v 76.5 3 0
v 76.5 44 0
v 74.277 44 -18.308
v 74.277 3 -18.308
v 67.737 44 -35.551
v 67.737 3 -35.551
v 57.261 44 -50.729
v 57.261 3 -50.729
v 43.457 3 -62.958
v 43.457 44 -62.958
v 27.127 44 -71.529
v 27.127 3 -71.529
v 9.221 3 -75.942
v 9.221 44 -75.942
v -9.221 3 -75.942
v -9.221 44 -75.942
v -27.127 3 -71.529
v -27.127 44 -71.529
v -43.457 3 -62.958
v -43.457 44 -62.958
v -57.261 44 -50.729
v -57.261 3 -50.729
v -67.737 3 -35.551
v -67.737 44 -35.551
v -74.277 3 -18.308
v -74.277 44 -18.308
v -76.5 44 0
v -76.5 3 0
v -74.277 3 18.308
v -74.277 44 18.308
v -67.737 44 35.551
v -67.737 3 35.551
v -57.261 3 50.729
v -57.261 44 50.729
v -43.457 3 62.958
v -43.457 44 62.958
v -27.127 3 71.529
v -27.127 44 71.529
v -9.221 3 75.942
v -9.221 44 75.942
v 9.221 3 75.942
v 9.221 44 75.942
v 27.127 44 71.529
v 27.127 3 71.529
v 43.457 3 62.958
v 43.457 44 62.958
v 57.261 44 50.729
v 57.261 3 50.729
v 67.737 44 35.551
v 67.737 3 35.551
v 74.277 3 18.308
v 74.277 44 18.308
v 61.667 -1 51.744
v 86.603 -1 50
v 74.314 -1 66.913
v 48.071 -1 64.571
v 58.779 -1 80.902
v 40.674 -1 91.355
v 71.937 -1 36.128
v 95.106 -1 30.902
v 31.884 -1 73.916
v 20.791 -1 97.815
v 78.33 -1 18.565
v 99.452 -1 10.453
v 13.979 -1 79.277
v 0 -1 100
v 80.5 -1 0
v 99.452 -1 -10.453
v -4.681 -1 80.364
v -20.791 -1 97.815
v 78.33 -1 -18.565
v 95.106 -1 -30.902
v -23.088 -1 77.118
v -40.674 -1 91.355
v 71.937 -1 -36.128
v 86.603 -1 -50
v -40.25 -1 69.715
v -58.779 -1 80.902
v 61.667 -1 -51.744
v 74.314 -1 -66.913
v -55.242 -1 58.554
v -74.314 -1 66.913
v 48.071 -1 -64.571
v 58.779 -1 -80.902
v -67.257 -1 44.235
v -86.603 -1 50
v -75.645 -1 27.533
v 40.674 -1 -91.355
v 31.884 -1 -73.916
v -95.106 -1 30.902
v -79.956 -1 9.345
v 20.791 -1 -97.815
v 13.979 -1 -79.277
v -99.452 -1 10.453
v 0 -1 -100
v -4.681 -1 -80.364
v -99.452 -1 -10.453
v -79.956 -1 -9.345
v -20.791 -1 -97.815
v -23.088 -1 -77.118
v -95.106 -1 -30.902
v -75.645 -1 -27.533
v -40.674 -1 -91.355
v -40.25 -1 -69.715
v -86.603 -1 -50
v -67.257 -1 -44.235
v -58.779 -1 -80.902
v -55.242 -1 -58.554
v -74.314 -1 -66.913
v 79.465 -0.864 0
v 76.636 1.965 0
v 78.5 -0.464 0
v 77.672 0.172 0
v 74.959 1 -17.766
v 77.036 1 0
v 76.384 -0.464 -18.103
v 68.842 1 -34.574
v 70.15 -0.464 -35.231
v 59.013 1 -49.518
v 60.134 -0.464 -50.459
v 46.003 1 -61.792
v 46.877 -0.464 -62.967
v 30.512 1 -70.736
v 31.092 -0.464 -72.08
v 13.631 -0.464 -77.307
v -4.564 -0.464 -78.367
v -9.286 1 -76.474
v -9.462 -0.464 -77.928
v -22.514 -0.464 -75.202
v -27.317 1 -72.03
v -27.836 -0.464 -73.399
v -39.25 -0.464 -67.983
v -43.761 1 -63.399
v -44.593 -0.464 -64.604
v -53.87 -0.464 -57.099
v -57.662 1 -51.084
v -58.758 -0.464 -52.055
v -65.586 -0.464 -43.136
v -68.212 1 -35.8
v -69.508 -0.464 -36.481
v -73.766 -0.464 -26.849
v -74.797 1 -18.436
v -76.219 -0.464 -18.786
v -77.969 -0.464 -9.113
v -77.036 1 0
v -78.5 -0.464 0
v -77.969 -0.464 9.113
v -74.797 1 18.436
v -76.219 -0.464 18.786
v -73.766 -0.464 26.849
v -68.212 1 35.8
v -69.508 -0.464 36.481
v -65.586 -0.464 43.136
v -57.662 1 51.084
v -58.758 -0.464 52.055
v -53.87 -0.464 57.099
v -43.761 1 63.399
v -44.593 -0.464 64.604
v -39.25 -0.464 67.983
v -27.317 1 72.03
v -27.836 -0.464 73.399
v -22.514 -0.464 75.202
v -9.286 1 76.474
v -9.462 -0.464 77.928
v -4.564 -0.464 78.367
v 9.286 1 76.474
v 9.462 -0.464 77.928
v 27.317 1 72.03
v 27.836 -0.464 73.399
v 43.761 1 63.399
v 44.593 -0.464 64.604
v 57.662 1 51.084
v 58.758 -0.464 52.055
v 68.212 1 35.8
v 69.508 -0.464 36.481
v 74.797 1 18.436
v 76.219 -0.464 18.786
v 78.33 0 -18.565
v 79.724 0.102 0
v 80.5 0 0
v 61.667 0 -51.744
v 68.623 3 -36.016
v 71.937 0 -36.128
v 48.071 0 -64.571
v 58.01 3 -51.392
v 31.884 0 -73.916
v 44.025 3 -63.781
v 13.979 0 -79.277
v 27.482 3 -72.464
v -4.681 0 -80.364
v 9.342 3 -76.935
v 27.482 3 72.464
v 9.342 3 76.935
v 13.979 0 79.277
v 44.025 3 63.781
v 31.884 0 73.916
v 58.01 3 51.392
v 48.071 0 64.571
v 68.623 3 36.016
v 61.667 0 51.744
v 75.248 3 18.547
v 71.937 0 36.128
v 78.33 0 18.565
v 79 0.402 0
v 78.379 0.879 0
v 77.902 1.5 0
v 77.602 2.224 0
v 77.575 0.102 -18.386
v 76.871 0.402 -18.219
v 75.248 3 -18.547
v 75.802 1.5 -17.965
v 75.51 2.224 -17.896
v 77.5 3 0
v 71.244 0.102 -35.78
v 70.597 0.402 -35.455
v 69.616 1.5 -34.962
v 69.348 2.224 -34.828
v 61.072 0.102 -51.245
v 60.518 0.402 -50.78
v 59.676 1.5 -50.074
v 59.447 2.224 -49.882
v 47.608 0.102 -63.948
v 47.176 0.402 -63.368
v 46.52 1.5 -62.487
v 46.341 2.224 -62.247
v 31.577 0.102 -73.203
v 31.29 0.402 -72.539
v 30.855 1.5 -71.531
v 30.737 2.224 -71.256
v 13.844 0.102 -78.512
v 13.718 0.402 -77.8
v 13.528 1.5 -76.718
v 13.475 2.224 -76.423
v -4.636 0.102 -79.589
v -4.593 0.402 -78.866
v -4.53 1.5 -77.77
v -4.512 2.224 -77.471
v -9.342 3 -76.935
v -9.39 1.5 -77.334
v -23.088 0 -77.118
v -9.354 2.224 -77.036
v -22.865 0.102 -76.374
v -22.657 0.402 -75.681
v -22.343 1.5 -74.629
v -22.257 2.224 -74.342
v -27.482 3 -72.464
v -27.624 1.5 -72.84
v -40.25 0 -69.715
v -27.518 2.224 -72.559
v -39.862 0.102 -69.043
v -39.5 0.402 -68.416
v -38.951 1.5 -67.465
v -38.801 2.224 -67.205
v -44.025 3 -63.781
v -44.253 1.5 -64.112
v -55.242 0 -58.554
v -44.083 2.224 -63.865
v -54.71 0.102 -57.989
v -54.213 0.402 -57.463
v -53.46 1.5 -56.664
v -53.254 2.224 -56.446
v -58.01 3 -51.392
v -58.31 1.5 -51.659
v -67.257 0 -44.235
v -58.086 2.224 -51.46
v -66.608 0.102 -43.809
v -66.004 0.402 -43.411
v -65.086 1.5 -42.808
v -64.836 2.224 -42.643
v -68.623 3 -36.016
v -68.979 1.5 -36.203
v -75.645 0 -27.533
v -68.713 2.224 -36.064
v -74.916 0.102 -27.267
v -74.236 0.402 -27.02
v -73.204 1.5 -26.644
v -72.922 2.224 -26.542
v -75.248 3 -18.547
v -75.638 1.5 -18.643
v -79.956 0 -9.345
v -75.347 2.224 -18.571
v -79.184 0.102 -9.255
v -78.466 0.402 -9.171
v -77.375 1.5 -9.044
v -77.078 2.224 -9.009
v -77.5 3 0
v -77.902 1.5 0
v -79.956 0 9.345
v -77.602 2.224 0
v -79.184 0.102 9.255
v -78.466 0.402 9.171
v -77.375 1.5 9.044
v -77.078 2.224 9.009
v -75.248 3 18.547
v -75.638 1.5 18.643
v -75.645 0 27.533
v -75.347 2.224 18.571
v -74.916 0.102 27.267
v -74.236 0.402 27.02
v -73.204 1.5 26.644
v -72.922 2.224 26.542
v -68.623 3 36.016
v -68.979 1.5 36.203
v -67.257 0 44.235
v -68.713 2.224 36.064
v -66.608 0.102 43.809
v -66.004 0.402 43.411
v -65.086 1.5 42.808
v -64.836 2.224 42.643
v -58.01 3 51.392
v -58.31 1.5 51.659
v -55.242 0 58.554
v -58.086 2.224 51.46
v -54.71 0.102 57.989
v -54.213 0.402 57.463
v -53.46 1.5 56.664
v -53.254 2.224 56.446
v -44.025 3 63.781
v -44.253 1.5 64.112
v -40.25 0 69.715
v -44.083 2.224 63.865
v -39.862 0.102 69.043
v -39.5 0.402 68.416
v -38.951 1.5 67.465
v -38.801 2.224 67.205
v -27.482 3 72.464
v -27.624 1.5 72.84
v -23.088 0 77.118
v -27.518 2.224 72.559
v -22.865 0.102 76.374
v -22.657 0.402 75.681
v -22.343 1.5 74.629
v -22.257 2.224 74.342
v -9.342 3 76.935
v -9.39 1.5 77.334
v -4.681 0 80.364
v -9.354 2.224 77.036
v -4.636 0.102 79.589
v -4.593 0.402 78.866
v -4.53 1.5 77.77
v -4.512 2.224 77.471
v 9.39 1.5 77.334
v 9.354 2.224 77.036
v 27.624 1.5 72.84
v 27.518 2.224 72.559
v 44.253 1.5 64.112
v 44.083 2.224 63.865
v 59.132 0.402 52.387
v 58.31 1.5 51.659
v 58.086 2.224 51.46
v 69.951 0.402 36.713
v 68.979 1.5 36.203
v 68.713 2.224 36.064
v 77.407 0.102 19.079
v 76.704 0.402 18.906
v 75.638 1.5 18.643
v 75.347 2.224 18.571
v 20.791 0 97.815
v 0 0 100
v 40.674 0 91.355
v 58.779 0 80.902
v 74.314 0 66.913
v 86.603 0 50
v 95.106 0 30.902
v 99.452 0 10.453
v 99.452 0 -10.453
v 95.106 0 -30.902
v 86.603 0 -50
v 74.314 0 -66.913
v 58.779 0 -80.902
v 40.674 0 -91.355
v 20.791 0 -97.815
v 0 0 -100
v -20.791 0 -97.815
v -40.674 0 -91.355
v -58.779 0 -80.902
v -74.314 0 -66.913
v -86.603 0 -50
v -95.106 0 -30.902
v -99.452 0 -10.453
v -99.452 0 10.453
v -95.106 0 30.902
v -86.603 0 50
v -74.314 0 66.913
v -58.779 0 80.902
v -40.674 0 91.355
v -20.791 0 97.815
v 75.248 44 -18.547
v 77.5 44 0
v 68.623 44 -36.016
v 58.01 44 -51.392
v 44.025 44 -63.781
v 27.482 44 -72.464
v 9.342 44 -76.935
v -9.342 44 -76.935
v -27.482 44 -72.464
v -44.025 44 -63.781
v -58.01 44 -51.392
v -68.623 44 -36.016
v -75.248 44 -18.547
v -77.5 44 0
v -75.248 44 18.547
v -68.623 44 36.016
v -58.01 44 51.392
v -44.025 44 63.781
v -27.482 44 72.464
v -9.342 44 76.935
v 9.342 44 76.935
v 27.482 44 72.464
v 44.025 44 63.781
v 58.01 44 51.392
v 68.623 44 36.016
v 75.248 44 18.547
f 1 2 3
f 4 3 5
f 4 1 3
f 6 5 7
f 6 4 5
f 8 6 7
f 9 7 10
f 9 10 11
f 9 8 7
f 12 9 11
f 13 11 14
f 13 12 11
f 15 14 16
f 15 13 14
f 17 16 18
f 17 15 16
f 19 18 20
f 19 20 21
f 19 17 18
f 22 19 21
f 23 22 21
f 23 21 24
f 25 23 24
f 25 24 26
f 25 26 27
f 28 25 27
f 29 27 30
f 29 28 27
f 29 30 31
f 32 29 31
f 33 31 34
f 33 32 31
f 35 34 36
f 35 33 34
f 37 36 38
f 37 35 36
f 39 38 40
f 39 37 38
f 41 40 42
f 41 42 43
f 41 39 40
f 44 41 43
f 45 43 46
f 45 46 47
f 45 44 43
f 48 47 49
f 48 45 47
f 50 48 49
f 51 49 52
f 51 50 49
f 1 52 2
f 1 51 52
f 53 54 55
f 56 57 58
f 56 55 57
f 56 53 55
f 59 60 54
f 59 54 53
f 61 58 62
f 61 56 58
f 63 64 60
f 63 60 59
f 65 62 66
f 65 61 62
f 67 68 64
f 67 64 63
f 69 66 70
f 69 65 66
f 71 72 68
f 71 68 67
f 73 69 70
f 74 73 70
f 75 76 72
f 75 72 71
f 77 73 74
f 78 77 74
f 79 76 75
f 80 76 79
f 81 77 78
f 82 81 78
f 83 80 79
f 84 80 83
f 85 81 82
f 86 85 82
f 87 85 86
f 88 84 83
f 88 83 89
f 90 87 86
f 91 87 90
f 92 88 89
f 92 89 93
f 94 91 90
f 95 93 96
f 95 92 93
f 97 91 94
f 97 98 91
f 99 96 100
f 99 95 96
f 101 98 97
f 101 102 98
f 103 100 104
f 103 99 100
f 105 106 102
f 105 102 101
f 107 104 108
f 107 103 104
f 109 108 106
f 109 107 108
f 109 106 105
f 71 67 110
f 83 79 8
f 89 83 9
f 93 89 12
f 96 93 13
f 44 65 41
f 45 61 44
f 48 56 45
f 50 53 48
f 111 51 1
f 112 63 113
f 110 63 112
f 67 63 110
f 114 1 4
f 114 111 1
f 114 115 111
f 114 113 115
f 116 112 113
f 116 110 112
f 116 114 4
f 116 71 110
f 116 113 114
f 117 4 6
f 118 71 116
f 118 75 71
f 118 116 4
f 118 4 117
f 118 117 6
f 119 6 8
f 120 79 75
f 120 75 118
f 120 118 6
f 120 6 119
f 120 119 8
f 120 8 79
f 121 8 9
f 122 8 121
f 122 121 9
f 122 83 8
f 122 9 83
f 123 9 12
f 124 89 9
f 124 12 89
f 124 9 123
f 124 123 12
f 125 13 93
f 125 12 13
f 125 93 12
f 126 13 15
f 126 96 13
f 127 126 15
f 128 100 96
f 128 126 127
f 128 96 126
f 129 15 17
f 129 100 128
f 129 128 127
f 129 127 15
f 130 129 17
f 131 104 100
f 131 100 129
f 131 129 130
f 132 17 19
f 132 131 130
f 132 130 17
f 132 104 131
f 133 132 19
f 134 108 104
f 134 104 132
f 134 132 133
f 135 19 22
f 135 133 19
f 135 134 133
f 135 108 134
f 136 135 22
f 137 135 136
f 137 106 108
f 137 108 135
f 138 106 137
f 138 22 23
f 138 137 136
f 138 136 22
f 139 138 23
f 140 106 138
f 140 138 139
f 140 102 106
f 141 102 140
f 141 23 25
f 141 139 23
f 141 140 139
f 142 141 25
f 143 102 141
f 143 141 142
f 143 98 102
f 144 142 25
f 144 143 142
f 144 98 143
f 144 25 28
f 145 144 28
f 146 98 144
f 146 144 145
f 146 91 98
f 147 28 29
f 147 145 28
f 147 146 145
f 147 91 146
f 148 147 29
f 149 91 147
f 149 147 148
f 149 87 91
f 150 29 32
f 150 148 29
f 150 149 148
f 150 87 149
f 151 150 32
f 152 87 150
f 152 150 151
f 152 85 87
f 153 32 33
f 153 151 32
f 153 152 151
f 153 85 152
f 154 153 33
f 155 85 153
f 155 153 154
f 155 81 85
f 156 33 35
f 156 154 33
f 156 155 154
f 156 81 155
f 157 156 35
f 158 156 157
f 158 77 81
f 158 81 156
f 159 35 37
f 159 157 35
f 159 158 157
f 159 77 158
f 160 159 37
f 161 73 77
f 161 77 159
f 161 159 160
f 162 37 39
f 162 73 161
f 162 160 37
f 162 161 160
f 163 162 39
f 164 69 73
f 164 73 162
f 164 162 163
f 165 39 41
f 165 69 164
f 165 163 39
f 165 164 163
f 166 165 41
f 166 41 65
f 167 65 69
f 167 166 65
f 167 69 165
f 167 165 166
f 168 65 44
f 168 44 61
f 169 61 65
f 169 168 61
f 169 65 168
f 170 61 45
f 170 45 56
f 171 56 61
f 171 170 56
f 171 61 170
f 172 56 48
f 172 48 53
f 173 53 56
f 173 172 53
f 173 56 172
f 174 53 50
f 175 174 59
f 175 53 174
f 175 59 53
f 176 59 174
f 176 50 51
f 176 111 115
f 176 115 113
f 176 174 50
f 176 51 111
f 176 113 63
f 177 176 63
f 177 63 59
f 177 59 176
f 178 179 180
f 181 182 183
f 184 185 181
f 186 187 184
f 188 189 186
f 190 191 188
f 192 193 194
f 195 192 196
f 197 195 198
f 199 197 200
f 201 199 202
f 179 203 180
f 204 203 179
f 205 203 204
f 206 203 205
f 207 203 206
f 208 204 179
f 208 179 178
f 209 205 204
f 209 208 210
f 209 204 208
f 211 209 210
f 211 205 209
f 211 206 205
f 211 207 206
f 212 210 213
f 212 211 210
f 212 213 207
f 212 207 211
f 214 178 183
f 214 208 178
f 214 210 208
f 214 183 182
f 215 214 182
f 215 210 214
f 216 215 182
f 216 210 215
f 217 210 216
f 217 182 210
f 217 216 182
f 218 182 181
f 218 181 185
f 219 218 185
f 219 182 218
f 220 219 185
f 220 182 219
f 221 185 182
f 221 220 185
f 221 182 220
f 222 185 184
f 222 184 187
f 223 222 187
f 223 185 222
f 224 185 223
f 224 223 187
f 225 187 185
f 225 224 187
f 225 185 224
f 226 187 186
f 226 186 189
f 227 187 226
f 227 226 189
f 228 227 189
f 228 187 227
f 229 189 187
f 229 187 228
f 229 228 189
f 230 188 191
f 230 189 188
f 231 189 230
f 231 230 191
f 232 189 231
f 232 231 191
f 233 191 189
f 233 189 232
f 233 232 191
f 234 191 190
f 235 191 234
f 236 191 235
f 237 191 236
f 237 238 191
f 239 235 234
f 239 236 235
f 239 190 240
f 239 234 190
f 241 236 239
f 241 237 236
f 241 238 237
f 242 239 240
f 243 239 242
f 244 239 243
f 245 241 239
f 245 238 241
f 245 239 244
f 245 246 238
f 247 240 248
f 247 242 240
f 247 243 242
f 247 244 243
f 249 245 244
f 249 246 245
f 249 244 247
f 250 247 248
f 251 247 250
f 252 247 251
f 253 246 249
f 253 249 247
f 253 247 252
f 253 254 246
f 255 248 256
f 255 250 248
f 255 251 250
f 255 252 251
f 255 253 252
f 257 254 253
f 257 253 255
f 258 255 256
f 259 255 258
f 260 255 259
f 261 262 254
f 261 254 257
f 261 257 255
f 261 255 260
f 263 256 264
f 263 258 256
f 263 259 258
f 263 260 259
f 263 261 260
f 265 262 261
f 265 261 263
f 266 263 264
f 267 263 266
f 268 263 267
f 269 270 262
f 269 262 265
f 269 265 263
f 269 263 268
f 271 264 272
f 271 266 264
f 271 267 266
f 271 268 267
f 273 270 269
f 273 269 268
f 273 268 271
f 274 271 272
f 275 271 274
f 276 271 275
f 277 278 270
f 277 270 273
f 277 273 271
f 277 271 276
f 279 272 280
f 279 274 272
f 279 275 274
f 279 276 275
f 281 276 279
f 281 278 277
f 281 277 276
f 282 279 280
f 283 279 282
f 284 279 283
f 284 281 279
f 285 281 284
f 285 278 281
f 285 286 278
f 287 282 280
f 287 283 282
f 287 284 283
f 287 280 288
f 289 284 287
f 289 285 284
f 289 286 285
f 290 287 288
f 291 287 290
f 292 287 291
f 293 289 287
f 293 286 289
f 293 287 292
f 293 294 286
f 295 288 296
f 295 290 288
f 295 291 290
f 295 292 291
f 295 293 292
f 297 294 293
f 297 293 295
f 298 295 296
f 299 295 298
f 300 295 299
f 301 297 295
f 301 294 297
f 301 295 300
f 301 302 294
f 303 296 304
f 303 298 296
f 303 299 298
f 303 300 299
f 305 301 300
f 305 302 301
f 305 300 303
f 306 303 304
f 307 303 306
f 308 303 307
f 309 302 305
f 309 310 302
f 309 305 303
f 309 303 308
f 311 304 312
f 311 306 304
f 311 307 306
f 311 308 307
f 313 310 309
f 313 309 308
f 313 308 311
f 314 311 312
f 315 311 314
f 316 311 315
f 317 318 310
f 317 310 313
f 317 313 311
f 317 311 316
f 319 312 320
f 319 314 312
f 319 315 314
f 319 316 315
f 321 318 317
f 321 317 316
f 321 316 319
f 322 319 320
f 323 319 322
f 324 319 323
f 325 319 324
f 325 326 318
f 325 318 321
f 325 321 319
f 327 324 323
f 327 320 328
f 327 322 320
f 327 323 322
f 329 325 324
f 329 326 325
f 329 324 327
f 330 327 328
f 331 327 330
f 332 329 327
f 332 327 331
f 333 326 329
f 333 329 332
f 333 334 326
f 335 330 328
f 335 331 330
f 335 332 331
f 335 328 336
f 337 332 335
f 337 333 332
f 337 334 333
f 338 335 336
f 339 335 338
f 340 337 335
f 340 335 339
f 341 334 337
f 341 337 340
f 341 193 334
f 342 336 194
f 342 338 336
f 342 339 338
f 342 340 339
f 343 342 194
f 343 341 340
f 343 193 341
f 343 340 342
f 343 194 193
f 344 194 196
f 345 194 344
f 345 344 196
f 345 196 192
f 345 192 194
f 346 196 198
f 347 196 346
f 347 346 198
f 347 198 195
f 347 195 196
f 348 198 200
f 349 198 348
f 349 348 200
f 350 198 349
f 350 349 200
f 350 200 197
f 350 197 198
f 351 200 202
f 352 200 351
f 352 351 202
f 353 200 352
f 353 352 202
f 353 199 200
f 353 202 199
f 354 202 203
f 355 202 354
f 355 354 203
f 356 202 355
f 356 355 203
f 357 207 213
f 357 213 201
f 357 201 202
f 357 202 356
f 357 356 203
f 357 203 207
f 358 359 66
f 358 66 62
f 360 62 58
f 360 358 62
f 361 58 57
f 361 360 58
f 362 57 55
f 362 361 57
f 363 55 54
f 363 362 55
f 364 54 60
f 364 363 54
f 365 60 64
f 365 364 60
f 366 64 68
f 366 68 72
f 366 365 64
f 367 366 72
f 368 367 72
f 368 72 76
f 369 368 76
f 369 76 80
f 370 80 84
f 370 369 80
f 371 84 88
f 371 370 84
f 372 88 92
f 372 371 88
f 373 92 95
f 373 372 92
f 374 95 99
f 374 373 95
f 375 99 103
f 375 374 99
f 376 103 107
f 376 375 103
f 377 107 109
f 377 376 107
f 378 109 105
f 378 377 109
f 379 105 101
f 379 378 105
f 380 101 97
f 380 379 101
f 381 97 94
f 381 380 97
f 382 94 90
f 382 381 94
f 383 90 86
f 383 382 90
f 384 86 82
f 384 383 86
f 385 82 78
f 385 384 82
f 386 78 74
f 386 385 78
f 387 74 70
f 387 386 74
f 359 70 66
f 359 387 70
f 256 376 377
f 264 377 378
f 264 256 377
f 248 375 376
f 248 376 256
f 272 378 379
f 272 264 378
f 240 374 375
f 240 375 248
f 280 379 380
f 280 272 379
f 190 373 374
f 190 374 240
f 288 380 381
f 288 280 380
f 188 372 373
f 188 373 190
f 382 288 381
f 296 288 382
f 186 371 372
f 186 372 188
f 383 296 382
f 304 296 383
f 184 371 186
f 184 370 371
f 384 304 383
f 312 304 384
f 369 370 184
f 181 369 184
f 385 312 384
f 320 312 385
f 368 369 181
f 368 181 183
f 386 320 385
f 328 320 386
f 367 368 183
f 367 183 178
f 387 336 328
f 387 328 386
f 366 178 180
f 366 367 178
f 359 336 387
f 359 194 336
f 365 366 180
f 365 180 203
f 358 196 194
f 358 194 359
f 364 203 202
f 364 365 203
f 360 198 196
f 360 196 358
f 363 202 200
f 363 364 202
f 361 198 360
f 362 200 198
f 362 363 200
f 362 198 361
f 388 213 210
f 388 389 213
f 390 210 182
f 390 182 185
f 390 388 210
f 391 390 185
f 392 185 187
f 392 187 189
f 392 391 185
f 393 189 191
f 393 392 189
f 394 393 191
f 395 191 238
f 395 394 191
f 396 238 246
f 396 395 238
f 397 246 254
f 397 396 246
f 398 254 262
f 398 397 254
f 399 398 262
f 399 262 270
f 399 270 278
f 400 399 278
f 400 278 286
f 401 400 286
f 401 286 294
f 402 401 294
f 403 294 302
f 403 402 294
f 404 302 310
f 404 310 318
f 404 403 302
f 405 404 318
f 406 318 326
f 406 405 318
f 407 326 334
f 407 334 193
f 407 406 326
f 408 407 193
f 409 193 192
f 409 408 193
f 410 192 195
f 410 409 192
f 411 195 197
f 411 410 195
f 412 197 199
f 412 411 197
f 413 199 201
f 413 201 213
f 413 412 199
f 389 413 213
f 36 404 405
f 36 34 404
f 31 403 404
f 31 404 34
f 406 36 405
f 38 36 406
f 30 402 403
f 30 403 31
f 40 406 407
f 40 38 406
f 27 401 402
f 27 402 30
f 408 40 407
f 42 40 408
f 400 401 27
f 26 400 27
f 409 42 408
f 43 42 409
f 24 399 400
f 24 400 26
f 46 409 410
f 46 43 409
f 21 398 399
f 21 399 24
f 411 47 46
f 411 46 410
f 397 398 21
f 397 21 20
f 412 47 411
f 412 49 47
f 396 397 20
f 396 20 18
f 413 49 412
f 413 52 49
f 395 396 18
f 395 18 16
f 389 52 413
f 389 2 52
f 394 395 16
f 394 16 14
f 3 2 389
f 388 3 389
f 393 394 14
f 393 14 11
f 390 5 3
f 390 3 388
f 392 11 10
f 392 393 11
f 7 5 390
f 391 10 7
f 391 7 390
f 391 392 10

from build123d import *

# Parameters (mm, degrees)
SKETCH15_R         = 100
SKETCH15_R_2       = 81.5
BASE_FLANGE1_DEPTH = 1


# Read off the part's stored shape, not the designer's step: Edge-Flange1
# Sheet-metal steps are written as plain solids
with BuildPart() as part:
    # Sketch15 → Base-Flange1 (new body)
    with BuildSketch(Plane(origin=(0, 0, 0), x_dir=(1, 0, 0), z_dir=(0, 1, 0))):
        with Locations(Location((0, 0, 0), (0, 0, 270))):
            Circle(SKETCH15_R)
        with Locations(Location((0, 0, 0), (0, 0, 270))):
            Circle(SKETCH15_R_2, mode=Mode.SUBTRACT)
    extrude(amount=-BASE_FLANGE1_DEPTH)

    # Edge-Flange1 outline → Edge-Flange1 (revolve)
    with BuildSketch(Plane.XY):
        with BuildLine():
            Line((80.5, -1), (81.5, -1))
            Line((81.5, -1), (81.5, 0))
            Line((81.5, 0), (80.5, 0))
            ThreePointArc((80.5, 0), (78.378679656, 0.878679656), (77.5, 3))
            Line((77.5, 3), (77.5, 44))
            Line((77.5, 44), (76.5, 44))
            Line((76.5, 44), (76.5, 3))
            ThreePointArc((76.5, 3), (77.671572875, 0.171572875), (80.5, -1))
        make_face()
    revolve(axis=Axis((0, 0, 0), (0, 1, 0)))


solid = part.part
